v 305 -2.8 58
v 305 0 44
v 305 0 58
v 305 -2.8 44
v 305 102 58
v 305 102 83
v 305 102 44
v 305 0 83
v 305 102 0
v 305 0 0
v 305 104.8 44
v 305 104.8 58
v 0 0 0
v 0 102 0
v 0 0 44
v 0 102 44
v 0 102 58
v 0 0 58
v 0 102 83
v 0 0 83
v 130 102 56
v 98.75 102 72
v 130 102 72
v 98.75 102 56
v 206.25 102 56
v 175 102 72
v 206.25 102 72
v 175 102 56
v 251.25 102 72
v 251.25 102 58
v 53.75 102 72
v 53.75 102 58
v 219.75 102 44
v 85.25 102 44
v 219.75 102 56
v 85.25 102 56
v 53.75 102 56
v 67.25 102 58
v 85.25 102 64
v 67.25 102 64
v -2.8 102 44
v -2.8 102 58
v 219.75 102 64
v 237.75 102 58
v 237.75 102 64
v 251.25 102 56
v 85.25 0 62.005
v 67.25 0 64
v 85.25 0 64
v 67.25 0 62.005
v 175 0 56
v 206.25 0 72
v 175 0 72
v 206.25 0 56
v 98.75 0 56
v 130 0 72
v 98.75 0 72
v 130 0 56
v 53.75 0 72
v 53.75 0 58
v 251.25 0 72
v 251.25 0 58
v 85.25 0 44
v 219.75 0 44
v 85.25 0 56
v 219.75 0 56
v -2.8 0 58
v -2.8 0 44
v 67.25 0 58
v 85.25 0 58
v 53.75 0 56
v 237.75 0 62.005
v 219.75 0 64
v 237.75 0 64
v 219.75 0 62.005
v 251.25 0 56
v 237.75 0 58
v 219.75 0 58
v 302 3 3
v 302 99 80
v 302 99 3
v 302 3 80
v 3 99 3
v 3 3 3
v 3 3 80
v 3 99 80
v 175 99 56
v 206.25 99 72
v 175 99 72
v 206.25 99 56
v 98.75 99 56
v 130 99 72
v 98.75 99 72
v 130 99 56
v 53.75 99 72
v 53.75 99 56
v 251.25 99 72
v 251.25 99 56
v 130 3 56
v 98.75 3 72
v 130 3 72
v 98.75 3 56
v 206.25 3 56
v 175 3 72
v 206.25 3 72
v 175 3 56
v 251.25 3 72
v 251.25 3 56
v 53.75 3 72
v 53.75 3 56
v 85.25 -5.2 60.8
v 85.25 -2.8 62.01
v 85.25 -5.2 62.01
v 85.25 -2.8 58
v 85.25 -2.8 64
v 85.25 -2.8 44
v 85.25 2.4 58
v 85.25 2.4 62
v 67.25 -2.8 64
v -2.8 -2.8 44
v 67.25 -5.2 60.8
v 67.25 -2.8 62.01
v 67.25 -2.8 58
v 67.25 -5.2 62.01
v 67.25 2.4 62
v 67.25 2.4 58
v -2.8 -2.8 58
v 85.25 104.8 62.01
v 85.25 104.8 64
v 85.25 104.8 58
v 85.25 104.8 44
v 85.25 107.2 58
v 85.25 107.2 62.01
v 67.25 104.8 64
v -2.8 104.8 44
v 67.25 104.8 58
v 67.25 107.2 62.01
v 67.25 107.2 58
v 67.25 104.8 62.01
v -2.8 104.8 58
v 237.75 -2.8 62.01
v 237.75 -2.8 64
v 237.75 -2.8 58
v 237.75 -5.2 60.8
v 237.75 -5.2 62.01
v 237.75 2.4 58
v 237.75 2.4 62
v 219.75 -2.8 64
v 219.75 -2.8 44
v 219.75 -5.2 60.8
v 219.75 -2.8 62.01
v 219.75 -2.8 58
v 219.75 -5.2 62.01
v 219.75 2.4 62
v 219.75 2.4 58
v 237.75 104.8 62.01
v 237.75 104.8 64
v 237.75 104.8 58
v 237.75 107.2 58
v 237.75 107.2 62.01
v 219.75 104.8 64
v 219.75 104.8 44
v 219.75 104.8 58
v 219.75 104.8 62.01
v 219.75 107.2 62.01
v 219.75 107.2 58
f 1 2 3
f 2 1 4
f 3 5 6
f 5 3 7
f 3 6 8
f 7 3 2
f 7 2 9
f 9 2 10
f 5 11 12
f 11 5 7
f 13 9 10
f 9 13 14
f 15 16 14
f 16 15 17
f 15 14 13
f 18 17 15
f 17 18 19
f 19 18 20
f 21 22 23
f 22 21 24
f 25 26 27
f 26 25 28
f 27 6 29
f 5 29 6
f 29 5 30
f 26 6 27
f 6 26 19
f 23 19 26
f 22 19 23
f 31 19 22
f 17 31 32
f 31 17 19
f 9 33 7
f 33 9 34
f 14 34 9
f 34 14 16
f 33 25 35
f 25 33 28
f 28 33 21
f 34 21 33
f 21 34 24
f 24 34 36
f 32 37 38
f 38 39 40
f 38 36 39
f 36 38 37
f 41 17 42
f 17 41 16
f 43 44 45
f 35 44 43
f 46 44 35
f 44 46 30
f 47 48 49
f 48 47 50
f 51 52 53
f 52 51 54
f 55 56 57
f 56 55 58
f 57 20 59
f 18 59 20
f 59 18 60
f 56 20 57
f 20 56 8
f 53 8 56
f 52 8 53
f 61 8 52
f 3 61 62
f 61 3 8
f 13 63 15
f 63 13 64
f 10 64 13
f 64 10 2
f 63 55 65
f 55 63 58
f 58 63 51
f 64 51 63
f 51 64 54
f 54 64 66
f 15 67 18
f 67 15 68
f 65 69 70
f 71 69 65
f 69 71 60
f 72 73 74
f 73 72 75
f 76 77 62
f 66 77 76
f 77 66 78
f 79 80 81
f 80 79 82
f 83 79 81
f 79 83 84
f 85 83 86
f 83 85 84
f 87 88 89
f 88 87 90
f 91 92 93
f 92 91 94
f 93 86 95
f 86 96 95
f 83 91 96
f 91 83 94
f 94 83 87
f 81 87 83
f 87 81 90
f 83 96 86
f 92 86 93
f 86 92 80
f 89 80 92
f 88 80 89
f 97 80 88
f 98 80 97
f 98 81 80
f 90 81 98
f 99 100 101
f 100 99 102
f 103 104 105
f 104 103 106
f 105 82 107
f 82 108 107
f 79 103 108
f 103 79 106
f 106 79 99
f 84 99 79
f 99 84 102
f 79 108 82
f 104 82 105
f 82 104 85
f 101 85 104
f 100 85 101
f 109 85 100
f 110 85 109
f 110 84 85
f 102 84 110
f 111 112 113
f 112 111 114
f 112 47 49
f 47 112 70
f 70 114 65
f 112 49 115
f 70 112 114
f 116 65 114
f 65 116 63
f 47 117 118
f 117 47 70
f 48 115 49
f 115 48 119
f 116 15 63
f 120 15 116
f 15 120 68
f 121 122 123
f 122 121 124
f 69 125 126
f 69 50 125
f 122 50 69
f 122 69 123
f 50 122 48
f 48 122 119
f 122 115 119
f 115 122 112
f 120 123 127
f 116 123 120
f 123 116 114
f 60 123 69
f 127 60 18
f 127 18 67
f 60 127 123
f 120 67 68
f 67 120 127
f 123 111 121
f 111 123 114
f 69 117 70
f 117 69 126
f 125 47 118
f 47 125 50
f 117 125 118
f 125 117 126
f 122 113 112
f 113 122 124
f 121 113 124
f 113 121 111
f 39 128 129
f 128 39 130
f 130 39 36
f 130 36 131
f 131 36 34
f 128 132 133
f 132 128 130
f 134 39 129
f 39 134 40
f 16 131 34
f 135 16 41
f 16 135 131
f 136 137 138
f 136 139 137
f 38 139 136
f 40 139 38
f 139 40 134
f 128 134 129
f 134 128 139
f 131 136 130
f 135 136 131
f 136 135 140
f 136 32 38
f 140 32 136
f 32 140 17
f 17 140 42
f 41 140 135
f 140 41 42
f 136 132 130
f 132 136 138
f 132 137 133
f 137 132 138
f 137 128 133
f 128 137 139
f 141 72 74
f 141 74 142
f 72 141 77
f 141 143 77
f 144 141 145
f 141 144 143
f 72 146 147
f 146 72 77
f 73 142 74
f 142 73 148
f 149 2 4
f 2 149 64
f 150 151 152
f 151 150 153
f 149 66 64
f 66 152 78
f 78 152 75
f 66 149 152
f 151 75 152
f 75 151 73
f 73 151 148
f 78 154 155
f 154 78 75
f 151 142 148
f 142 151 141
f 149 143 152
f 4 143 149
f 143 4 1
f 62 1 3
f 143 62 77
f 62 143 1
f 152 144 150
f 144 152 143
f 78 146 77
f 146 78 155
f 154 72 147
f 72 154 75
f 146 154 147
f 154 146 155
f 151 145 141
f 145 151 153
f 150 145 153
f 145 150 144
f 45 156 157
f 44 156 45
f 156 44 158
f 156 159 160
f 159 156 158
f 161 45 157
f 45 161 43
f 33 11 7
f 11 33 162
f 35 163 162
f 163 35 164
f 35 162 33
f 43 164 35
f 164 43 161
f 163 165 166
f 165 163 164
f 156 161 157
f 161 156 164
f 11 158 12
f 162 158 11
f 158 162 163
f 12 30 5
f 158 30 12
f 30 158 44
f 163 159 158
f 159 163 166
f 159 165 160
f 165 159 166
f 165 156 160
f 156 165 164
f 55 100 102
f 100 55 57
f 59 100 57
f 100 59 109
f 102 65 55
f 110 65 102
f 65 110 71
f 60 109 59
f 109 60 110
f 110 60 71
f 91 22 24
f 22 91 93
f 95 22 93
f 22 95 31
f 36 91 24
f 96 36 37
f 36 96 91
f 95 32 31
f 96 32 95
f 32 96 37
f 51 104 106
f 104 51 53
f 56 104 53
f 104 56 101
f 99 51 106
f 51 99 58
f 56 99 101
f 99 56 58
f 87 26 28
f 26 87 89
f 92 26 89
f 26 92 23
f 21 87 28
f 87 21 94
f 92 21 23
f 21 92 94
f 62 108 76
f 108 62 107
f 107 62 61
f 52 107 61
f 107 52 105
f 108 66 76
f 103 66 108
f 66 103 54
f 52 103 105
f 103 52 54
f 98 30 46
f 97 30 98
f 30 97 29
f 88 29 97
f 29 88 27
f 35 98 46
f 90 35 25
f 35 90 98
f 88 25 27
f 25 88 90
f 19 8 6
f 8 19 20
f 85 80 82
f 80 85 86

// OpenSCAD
// 04_corner_hook.scad
// RETROFIT ATTACHMENT — Version 4: Corner L-Hook
//
// NEW tray (z=0..50, blue) has an L-shaped hook at each of the 4 corners.
// Each L-hook has:
//   - a short horizontal arm running along the short-end face (X direction)
//   - a vertical stem that turns along the long-side face
//   - an inward hook at the top that grabs the NEAREST long-side window
//     (window 0 at X≈76 for the left corners; window 2 at X≈229 for right)
//
// Corner placement keeps clips well away from vial holes; 4 hooks share load.
//
// TOP tray (z=50..83, grey) FIXED — ZERO geometry added.
//
// explode=0 engaged, explode=1 lifted apart.

explode = 0;

W    = 305;   D  = 102;   Hn = 50;   Ht = 33;   wall = 3;

win_w  = 45;   win_h = 16;   win_zc = 64;
function win_cx(i) = W * (i+1) / 4;

// Corner hook geometry
ch_t    = 2.8;   // hook thickness
ch_yw   = 18;    // width of stem along long-side (Y-axis extent of stem)
ch_h    = 38;    // stem height above new-tray top
arm_len = 12;    // length of corner arm along short-end face
root_z  = 6;     // how deep the base roots below new-tray top
hook_dep = 2.4;
hook_h   = 4.0;
lead_in  = 1.2;

hook_z = win_zc - win_h/2 + 2;

expl = 45 * explode;

c_new  = [0.22, 0.55, 0.85, 1.00];
c_top  = [0.80, 0.80, 0.80, 0.80];
c_clip = [0.95, 0.78, 0.05, 1.00];   // yellow

module top_tray() {
    color(c_top)
    translate([0, 0, Hn + expl])
    difference() {
        cube([W, D, Ht]);
        translate([wall, wall, -0.01])
            cube([W-2*wall, D-2*wall, Ht-wall+0.01]);
        for (i=[0:2]) {
            translate([win_cx(i)-win_w/2, -0.01, (win_zc-Hn)-win_h/2])
                cube([win_w, wall+0.02, win_h]);
            translate([win_cx(i)-win_w/2, D-wall-0.01, (win_zc-Hn)-win_h/2])
                cube([win_w, wall+0.02, win_h]);
        }
    }
}

module new_tray_body() {
    color(c_new)
    difference() {
        cube([W, D, Hn]);
        translate([wall, wall, wall])
            cube([W-2*wall, D-2*wall, Hn]);
    }
}

// L-hook at one corner
// cx_side: 0=left (X=0), 1=right (X=W)
// cy_side: 0=front (Y=0), 1=back (Y=D)
module corner_hook(cx_side, cy_side) {
    win_i = (cx_side == 0) ? 0 : 2;   // nearest window
    wcx   = win_cx(win_i);             // window centre X

    y0   = (cy_side==0) ? -ch_t : D;
    inwd = (cy_side==0) ? 1 : -1;

    // Stem X extent: centred on window centre
    stem_x0 = wcx - ch_yw/2;
    stem_x1 = wcx + ch_yw/2;

    // Corner arm runs from stem_x edge to the short end wall
    arm_x0 = (cx_side==0) ? -ch_t : W;
    arm_x1 = (cx_side==0) ? stem_x0 + ch_t : stem_x1;   // connects to stem

    stem_bot = Hn - root_z;
    stem_top = hook_z + hook_h + 2;

    color(c_clip) {
        // vertical stem on long-side face
        translate([stem_x0, y0, stem_bot])
            cube([ch_yw, ch_t, stem_top - stem_bot]);

        // horizontal arm along short-end face (low section only)
        arm_len_actual = abs(arm_x1 - arm_x0);
        translate([min(arm_x0, arm_x1), y0, stem_bot])
            cube([arm_len_actual, ch_t, root_z + 8]);

        // hook nose
        translate([stem_x0, y0, hook_z])
        hull() {
            cube([ch_yw, ch_t + hook_dep, hook_h]);
            translate([0, inwd*(-hook_dep), hook_h - lead_in])
                cube([ch_yw, ch_t, lead_in + 0.01]);
        }
    }
}

// ASSEMBLY — 4 corners
new_tray_body();
corner_hook(0, 0);   // left-front
corner_hook(0, 1);   // left-back
corner_hook(1, 0);   // right-front
corner_hook(1, 1);   // right-back
top_tray();
